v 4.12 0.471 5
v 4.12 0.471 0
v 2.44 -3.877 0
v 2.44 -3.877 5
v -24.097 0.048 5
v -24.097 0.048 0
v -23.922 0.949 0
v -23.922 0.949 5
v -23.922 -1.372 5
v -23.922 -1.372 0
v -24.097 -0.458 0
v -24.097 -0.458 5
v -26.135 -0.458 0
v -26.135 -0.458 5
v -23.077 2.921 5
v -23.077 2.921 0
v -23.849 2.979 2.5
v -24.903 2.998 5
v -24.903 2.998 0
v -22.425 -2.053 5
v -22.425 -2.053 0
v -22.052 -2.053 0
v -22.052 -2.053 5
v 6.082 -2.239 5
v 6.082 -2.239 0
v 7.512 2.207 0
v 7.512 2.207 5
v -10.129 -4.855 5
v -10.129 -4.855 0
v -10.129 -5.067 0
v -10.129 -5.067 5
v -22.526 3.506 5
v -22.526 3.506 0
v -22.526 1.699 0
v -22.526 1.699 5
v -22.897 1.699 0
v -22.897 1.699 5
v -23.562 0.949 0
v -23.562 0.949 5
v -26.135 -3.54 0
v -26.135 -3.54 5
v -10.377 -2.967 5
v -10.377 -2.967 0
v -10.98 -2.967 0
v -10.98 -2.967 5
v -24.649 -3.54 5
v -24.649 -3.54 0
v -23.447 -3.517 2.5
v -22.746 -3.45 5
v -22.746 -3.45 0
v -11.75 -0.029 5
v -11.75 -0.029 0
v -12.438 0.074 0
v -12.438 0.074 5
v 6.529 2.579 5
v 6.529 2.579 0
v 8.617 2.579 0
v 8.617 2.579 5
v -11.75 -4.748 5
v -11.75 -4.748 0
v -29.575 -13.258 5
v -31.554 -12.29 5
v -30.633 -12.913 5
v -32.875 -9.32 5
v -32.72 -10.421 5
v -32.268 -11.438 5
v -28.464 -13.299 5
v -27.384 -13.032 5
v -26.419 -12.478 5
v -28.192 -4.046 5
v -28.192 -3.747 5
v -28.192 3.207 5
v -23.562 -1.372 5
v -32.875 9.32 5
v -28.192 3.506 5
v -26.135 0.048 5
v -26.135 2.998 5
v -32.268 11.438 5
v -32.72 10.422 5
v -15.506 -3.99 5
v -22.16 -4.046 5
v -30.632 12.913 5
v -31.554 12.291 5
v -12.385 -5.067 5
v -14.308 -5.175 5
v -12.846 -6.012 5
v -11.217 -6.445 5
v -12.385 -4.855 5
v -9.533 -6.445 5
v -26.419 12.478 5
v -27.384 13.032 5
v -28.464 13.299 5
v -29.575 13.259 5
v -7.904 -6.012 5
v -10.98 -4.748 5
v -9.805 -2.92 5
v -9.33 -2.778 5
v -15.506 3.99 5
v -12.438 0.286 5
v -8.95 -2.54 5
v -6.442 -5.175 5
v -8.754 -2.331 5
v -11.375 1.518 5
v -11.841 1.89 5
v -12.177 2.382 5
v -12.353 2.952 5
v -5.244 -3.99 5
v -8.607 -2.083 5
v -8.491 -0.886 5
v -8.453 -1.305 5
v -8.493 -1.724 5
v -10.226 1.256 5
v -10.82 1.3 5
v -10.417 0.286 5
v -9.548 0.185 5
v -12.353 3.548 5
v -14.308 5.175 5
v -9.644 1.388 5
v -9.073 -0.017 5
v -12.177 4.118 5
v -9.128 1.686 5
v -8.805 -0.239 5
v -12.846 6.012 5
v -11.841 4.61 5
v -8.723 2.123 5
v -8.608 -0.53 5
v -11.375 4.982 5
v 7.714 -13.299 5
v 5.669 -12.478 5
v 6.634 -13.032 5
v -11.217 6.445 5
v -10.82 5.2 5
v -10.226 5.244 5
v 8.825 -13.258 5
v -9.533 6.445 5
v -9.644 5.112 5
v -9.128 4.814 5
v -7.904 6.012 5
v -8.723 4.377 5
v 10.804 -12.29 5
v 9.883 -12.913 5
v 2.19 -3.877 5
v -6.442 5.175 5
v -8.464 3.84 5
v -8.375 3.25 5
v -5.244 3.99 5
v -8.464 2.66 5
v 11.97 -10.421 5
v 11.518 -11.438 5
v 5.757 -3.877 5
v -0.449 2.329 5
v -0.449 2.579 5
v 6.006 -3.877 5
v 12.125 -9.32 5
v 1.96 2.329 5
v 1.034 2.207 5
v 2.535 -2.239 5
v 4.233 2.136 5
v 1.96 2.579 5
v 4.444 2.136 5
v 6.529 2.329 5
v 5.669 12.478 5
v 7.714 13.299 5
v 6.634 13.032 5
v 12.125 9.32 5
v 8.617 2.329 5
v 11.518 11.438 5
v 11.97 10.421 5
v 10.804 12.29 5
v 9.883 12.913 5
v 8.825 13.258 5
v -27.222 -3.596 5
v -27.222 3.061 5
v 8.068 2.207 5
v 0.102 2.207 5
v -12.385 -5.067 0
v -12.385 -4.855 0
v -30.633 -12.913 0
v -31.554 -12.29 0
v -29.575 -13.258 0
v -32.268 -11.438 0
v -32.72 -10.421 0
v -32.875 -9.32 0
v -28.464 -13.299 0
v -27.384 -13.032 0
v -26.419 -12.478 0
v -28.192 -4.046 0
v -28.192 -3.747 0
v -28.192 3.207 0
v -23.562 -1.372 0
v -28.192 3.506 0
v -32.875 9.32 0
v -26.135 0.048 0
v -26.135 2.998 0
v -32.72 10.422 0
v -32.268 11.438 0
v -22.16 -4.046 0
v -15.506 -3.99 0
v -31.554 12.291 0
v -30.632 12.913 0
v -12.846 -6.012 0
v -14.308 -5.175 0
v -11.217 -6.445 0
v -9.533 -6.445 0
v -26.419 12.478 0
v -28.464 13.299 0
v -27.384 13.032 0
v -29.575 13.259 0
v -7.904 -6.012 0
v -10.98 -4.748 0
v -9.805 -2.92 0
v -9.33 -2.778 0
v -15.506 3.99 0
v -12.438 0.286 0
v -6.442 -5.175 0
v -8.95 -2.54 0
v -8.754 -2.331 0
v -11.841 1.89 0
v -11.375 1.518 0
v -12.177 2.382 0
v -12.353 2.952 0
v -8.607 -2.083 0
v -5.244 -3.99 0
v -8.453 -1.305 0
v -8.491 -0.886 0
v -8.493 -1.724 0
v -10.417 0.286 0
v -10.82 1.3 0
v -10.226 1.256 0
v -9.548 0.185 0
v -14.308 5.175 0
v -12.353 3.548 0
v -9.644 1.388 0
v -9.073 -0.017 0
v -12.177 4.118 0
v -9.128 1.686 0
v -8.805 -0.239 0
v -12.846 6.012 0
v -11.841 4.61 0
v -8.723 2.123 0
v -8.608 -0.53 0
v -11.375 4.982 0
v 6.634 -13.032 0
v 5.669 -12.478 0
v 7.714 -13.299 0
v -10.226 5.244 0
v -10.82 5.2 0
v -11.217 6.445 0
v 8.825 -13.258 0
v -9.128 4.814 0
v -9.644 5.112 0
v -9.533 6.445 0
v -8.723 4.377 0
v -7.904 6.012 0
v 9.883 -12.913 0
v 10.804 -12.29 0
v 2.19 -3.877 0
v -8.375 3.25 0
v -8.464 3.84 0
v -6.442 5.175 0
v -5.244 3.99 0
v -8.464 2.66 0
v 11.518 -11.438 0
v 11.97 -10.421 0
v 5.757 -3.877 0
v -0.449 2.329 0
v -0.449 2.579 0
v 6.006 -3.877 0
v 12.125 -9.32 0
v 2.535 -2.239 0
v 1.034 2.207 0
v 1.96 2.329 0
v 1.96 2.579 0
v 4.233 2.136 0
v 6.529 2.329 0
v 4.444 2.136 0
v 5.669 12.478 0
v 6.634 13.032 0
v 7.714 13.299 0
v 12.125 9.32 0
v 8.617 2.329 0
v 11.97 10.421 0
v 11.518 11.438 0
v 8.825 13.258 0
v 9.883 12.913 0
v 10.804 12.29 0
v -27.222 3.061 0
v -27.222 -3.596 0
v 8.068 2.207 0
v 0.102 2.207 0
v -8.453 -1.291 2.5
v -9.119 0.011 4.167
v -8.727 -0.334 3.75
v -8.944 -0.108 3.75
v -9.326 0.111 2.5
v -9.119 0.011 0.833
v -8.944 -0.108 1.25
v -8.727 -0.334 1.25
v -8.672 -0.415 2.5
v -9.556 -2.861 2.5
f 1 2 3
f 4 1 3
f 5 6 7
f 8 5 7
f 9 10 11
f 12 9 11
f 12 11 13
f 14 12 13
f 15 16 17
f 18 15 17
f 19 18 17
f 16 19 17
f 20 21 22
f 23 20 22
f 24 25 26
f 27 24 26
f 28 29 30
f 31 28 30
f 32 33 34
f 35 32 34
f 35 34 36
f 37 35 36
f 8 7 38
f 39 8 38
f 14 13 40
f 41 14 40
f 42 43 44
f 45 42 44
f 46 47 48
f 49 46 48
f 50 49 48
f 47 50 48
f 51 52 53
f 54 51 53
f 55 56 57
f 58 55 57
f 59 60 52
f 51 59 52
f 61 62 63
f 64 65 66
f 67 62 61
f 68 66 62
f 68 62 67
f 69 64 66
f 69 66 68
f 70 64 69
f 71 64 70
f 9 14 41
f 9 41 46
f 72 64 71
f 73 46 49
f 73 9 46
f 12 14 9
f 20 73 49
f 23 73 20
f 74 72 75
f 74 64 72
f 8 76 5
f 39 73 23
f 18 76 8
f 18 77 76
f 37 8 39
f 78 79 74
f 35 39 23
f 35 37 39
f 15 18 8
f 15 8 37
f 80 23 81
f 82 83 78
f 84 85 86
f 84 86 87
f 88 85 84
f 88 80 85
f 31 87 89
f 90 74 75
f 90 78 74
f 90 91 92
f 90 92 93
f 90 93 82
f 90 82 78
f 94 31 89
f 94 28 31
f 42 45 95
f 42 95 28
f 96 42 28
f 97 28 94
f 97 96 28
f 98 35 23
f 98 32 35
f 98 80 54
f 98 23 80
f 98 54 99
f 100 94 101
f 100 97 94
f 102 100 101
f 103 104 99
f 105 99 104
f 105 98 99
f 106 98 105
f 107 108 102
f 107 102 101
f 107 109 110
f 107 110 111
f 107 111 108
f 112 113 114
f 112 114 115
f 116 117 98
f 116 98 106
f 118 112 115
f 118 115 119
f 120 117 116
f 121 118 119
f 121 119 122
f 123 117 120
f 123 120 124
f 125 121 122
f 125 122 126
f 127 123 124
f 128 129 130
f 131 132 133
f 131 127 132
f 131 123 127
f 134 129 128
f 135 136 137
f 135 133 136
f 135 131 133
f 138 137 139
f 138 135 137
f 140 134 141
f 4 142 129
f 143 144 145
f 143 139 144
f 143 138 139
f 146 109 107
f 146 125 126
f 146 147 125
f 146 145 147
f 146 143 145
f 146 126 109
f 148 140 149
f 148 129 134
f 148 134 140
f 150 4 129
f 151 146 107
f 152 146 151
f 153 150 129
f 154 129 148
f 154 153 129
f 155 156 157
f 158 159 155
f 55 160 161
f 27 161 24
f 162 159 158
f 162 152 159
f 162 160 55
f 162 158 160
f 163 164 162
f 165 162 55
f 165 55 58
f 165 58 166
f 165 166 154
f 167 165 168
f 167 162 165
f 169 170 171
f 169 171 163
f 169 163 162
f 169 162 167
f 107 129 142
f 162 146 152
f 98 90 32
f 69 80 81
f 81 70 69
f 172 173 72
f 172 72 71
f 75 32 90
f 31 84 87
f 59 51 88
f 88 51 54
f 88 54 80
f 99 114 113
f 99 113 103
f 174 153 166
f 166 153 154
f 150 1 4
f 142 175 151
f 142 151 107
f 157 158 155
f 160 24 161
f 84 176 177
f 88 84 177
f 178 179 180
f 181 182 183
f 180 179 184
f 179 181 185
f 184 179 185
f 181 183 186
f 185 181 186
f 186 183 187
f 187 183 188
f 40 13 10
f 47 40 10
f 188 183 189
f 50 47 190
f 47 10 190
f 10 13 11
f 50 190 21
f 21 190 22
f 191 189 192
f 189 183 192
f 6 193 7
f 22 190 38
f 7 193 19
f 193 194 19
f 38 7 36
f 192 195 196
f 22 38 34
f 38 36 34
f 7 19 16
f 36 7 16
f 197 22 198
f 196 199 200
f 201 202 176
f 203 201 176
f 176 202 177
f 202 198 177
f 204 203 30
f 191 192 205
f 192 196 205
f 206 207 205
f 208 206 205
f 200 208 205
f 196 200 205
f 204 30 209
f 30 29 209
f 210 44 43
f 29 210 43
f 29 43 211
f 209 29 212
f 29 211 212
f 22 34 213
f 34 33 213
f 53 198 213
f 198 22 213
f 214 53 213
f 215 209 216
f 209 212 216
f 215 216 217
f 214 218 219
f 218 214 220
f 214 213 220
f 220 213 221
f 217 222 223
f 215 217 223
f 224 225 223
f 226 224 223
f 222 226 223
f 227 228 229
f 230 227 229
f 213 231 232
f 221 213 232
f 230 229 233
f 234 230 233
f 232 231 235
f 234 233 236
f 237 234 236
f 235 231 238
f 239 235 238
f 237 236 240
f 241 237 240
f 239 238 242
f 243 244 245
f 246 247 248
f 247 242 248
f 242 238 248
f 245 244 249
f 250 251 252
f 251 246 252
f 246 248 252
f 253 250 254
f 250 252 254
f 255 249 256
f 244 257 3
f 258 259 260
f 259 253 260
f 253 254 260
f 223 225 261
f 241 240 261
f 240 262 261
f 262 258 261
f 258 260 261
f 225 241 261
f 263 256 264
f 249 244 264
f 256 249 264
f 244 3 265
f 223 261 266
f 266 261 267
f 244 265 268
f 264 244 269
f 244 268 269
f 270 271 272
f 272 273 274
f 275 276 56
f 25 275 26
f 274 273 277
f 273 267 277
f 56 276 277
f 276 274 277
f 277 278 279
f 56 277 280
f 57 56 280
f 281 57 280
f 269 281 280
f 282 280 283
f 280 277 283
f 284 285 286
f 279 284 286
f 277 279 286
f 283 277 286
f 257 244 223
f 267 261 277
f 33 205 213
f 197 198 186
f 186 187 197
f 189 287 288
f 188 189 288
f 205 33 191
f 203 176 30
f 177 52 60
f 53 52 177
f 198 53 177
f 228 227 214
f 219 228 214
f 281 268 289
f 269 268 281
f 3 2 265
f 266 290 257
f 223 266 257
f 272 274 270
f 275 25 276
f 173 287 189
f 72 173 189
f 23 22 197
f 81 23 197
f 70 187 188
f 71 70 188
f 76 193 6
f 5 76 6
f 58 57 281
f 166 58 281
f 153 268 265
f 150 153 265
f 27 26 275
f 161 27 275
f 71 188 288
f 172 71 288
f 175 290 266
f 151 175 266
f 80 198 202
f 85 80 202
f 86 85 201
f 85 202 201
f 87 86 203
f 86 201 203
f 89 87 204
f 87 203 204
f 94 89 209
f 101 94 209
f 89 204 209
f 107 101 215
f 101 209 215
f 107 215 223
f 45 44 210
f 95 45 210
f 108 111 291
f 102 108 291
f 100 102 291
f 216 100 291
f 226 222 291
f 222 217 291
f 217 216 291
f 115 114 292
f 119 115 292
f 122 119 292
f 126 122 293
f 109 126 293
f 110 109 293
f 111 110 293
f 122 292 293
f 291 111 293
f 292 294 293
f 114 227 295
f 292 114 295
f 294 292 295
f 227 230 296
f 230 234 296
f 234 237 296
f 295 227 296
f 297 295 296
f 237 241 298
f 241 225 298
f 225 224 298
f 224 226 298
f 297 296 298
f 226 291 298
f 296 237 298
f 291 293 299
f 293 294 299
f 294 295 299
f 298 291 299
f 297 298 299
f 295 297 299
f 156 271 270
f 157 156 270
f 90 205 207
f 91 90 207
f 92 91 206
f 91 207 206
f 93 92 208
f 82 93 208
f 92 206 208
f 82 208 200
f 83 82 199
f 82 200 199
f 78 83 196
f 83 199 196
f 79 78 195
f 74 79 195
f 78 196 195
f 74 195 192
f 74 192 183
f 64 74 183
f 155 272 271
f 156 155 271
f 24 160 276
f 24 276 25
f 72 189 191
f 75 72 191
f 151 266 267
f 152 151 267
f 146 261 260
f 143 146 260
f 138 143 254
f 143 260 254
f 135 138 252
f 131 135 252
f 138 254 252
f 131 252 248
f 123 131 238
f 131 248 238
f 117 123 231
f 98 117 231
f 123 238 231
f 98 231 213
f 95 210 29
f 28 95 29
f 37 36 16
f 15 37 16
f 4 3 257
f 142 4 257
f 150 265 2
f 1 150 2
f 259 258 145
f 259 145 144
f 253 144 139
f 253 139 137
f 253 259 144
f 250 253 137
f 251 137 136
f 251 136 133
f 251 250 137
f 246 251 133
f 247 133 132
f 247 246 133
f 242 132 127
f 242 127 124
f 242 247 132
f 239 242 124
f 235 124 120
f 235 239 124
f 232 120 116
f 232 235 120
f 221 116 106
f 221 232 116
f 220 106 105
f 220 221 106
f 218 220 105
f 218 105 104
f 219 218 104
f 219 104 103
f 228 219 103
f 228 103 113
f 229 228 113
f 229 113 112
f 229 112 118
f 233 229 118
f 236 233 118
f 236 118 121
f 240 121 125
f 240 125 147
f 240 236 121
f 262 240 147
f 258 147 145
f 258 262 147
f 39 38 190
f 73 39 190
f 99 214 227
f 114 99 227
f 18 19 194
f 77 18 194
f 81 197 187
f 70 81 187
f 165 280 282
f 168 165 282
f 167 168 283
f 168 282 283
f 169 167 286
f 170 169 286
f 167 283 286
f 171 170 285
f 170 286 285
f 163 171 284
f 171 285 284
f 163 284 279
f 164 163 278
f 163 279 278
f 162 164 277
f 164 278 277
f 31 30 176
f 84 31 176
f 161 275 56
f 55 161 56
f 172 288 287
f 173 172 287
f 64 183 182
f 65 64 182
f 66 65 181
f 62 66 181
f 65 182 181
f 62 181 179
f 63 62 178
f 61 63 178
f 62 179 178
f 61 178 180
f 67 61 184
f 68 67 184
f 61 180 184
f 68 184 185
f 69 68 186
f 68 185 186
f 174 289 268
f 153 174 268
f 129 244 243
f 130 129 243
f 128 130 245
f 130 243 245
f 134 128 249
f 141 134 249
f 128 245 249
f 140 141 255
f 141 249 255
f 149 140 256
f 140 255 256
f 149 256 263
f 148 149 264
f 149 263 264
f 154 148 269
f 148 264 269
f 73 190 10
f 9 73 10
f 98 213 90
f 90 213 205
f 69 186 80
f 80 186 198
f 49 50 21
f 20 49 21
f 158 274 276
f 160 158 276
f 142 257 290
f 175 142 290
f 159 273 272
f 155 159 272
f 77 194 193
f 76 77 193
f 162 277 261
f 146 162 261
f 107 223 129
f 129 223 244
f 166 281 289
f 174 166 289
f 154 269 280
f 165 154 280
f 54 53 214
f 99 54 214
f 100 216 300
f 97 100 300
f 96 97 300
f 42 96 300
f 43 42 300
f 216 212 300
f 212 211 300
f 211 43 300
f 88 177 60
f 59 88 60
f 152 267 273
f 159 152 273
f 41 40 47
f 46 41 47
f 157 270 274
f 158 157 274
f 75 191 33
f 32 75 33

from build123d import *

# Parameters (mm, degrees)
F0_R     = 2
F1_DEPTH = 5


with BuildPart() as f1:
    # F0 (on Top) → F1 (new body)
    with BuildSketch(Plane.XY):
        with BuildLine():
            ThreePointArc((-3.8750014305, 0), (-4.2267672199, -2.1093164988), (-5.2439909973, -3.9903298027))
            Line((-5.2439909973, -3.9903298027), (5.6694109986, -12.4775612749))
            ThreePointArc((5.6694109986, -12.4775612749), (9.8825038634, -12.9132287637), (12.1249985695, -9.3200163929))
            Line((12.1249985695, -9.3200163929), (12.1249985695, 9.3200163929))
            ThreePointArc((12.1249985695, 9.3200163929), (9.8825038634, 12.9132287637), (5.6694109986, 12.4775612749))
            Line((5.6694109986, 12.4775612749), (-5.2439909973, 3.9903298027))
            ThreePointArc((-5.2439909973, 3.9903298027), (-4.2267672199, 2.1093164988), (-3.8750014305, 0))
        make_face()
        Polygon((8.0675292322, 2.2068999953), (6.0064843484, -3.8768709144), (5.756569483, -3.8768709144), (4.1200787681, 0.4710455388), (2.4399282273, -3.8768709144), (2.1900133619, -3.8768709144), (0.1018692759, 2.2068999953), (-0.449147837, 2.3288464056), (-0.449147837, 2.5787612709), (1.9596701426, 2.5787612709), (1.9596701426, 2.3288464056), (1.0337807317, 2.2068999953), (2.5347754353, -2.2388746883), (4.2329921109, 2.1361409672), (4.4437636841, 2.1361409672), (6.0817599103, -2.2388746883), (7.5119955856, 2.2068999953), (6.5288967477, 2.3288464056), (6.5288967477, 2.5787612709), (8.6170408338, 2.5787612709), (8.6170408338, 2.3288464056), align=None, mode=Mode.SUBTRACT)
        with BuildLine():
            ThreePointArc((-15.5059721811, 3.9903808286), (-16.8750014304, 3.23201e-05), (-15.5060118637, -3.9903298027))
            ThreePointArc((-15.5060118637, -3.9903298027), (-10.3750014305, -6.5), (-5.2439909973, -3.9903298027))
            ThreePointArc((-5.2439909973, -3.9903298027), (-4.2267672199, -2.1093164988), (-3.8750014305, 0))
            ThreePointArc((-3.8750014305, 0), (-4.2267672199, 2.1093164988), (-5.2439909973, 3.9903298027))
            ThreePointArc((-5.2439909973, 3.9903298027), (-10.3749691104, 6.4999999999), (-15.5059721811, 3.9903808286))
        make_face()
        with BuildLine():
            Line((-10.3772096263, -2.9674286779), (-10.9801440776, -2.9674286779))
            Line((-10.9801440776, -2.9674286779), (-10.9801440776, -4.7481291549))
            Line((-10.9801440776, -4.7481291549), (-10.1293933476, -4.8554310488))
            Line((-10.1293933476, -4.8554310488), (-10.1293933476, -5.0674800295))
            Line((-10.1293933476, -5.0674800295), (-12.385287926, -5.0674800295))
            Line((-12.385287926, -5.0674800295), (-12.385287926, -4.8554310488))
            Line((-12.385287926, -4.8554310488), (-11.7504183872, -4.7481291549))
            Line((-11.7504183872, -4.7481291549), (-11.7504183872, -0.0294006313))
            Line((-11.7504183872, -0.0294006313), (-12.4376614694, 0.0740690521))
            Line((-12.4376614694, 0.0740690521), (-12.4376614694, 0.2861180328))
            Line((-12.4376614694, 0.2861180328), (-10.4168091348, 0.2861180328))
            add(Edge.make_bspline(
                [(-10.4168091348, 0.2861180328), (-8.4534399575, 0.2861180328), (-8.4534399575, -1.2914752879)],
                knots=[0, 0, 0, 1, 1, 1], degree=2))
            add(Edge.make_bspline(
                [(-8.4534399575, -1.2914752879), (-8.4534399575, -2.1128457374), (-8.9503499185, -2.5401372077)],
                knots=[0, 0, 0, 1, 1, 1], degree=2))
            add(Edge.make_bspline(
                [(-8.9503499185, -2.5401372077), (-9.4472598794, -2.9674286779), (-10.3772096263, -2.9674286779)],
                knots=[0, 0, 0, 1, 1, 1], degree=2))
        make_face(mode=Mode.SUBTRACT)
        with Locations((-10.3750014305, 3.25)):
            Circle(F0_R, mode=Mode.SUBTRACT)
        with BuildLine():
            Line((-32.8750014305, 9.3202724501), (-32.8750014305, -9.3200163929))
            ThreePointArc((-32.8750014305, -9.3200163929), (-30.6325067245, -12.9132287637), (-26.4194138596, -12.4775612749))
            Line((-26.4194138596, -12.4775612749), (-15.5060118637, -3.9903298027))
            ThreePointArc((-15.5060118637, -3.9903298027), (-16.8750014304, 3.23201e-05), (-15.5059721811, 3.9903808286))
            Line((-15.5059721811, 3.9903808286), (-26.4193824591, 12.477792912))
            ThreePointArc((-26.4193824591, 12.477792912), (-30.6324888578, 12.9134935598), (-32.8750014305, 9.3202724501))
        make_face()
        with BuildLine():
            Line((-28.1915230864, -4.0461723693), (-28.1915230864, -3.7470318405))
            Line((-28.1915230864, -3.7470318405), (-27.2220194448, -3.5956595247))
            Line((-27.2220194448, -3.5956595247), (-27.2220194448, 3.0611182673))
            Line((-27.2220194448, 3.0611182673), (-28.1915230864, 3.2070844289))
            Line((-28.1915230864, 3.2070844289), (-28.1915230864, 3.5062249578))
            Line((-28.1915230864, 3.5062249578), (-22.5258735526, 3.5062249578))
            Line((-22.5258735526, 3.5062249578), (-22.5258735526, 1.6987674252))
            Line((-22.5258735526, 1.6987674252), (-22.8970961366, 1.6987674252))
            Line((-22.8970961366, 1.6987674252), (-23.0773012744, 2.9205582598))
            add(Edge.make_bspline(
                [(-23.0773012744, 2.9205582598), (-23.7080192569, 2.9980464691), (-24.9027793208, 2.9980464691)],
                knots=[0, 0, 0, 1, 1, 1], degree=2))
            Line((-24.9027793208, 2.9980464691), (-26.1353824636, 2.9980464691))
            Line((-26.1353824636, 2.9980464691), (-26.1353824636, 0.0480883625))
            Line((-26.1353824636, 0.0480883625), (-24.0972623546, 0.0480883625))
            Line((-24.0972623546, 0.0480883625), (-23.9224633709, 0.9491140518))
            Line((-23.9224633709, 0.9491140518), (-23.5620530952, 0.9491140518))
            Line((-23.5620530952, 0.9491140518), (-23.5620530952, -1.3719281237))
            Line((-23.5620530952, -1.3719281237), (-23.9224633709, -1.3719281237))
            Line((-23.9224633709, -1.3719281237), (-24.0972623546, -0.4582880748))
            Line((-24.0972623546, -0.4582880748), (-26.1353824636, -0.4582880748))
            Line((-26.1353824636, -0.4582880748), (-26.1353824636, -3.5397959319))
            Line((-26.1353824636, -3.5397959319), (-24.6486900764, -3.5397959319))
            add(Edge.make_bspline(
                [(-24.6486900764, -3.5397959319), (-23.1962366654, -3.5397959319), (-22.7457238208, -3.449693363)],
                knots=[0, 0, 0, 1, 1, 1], degree=2))
            Line((-22.7457238208, -3.449693363), (-22.4249586754, -2.0531035447))
            Line((-22.4249586754, -2.0531035447), (-22.0519340401, -2.0531035447))
            Line((-22.0519340401, -2.0531035447), (-22.1600571228, -4.0461723693))
            Line((-22.1600571228, -4.0461723693), (-28.1915230864, -4.0461723693))
        make_face(mode=Mode.SUBTRACT)
    extrude(amount=F1_DEPTH)


solid = f1.part
